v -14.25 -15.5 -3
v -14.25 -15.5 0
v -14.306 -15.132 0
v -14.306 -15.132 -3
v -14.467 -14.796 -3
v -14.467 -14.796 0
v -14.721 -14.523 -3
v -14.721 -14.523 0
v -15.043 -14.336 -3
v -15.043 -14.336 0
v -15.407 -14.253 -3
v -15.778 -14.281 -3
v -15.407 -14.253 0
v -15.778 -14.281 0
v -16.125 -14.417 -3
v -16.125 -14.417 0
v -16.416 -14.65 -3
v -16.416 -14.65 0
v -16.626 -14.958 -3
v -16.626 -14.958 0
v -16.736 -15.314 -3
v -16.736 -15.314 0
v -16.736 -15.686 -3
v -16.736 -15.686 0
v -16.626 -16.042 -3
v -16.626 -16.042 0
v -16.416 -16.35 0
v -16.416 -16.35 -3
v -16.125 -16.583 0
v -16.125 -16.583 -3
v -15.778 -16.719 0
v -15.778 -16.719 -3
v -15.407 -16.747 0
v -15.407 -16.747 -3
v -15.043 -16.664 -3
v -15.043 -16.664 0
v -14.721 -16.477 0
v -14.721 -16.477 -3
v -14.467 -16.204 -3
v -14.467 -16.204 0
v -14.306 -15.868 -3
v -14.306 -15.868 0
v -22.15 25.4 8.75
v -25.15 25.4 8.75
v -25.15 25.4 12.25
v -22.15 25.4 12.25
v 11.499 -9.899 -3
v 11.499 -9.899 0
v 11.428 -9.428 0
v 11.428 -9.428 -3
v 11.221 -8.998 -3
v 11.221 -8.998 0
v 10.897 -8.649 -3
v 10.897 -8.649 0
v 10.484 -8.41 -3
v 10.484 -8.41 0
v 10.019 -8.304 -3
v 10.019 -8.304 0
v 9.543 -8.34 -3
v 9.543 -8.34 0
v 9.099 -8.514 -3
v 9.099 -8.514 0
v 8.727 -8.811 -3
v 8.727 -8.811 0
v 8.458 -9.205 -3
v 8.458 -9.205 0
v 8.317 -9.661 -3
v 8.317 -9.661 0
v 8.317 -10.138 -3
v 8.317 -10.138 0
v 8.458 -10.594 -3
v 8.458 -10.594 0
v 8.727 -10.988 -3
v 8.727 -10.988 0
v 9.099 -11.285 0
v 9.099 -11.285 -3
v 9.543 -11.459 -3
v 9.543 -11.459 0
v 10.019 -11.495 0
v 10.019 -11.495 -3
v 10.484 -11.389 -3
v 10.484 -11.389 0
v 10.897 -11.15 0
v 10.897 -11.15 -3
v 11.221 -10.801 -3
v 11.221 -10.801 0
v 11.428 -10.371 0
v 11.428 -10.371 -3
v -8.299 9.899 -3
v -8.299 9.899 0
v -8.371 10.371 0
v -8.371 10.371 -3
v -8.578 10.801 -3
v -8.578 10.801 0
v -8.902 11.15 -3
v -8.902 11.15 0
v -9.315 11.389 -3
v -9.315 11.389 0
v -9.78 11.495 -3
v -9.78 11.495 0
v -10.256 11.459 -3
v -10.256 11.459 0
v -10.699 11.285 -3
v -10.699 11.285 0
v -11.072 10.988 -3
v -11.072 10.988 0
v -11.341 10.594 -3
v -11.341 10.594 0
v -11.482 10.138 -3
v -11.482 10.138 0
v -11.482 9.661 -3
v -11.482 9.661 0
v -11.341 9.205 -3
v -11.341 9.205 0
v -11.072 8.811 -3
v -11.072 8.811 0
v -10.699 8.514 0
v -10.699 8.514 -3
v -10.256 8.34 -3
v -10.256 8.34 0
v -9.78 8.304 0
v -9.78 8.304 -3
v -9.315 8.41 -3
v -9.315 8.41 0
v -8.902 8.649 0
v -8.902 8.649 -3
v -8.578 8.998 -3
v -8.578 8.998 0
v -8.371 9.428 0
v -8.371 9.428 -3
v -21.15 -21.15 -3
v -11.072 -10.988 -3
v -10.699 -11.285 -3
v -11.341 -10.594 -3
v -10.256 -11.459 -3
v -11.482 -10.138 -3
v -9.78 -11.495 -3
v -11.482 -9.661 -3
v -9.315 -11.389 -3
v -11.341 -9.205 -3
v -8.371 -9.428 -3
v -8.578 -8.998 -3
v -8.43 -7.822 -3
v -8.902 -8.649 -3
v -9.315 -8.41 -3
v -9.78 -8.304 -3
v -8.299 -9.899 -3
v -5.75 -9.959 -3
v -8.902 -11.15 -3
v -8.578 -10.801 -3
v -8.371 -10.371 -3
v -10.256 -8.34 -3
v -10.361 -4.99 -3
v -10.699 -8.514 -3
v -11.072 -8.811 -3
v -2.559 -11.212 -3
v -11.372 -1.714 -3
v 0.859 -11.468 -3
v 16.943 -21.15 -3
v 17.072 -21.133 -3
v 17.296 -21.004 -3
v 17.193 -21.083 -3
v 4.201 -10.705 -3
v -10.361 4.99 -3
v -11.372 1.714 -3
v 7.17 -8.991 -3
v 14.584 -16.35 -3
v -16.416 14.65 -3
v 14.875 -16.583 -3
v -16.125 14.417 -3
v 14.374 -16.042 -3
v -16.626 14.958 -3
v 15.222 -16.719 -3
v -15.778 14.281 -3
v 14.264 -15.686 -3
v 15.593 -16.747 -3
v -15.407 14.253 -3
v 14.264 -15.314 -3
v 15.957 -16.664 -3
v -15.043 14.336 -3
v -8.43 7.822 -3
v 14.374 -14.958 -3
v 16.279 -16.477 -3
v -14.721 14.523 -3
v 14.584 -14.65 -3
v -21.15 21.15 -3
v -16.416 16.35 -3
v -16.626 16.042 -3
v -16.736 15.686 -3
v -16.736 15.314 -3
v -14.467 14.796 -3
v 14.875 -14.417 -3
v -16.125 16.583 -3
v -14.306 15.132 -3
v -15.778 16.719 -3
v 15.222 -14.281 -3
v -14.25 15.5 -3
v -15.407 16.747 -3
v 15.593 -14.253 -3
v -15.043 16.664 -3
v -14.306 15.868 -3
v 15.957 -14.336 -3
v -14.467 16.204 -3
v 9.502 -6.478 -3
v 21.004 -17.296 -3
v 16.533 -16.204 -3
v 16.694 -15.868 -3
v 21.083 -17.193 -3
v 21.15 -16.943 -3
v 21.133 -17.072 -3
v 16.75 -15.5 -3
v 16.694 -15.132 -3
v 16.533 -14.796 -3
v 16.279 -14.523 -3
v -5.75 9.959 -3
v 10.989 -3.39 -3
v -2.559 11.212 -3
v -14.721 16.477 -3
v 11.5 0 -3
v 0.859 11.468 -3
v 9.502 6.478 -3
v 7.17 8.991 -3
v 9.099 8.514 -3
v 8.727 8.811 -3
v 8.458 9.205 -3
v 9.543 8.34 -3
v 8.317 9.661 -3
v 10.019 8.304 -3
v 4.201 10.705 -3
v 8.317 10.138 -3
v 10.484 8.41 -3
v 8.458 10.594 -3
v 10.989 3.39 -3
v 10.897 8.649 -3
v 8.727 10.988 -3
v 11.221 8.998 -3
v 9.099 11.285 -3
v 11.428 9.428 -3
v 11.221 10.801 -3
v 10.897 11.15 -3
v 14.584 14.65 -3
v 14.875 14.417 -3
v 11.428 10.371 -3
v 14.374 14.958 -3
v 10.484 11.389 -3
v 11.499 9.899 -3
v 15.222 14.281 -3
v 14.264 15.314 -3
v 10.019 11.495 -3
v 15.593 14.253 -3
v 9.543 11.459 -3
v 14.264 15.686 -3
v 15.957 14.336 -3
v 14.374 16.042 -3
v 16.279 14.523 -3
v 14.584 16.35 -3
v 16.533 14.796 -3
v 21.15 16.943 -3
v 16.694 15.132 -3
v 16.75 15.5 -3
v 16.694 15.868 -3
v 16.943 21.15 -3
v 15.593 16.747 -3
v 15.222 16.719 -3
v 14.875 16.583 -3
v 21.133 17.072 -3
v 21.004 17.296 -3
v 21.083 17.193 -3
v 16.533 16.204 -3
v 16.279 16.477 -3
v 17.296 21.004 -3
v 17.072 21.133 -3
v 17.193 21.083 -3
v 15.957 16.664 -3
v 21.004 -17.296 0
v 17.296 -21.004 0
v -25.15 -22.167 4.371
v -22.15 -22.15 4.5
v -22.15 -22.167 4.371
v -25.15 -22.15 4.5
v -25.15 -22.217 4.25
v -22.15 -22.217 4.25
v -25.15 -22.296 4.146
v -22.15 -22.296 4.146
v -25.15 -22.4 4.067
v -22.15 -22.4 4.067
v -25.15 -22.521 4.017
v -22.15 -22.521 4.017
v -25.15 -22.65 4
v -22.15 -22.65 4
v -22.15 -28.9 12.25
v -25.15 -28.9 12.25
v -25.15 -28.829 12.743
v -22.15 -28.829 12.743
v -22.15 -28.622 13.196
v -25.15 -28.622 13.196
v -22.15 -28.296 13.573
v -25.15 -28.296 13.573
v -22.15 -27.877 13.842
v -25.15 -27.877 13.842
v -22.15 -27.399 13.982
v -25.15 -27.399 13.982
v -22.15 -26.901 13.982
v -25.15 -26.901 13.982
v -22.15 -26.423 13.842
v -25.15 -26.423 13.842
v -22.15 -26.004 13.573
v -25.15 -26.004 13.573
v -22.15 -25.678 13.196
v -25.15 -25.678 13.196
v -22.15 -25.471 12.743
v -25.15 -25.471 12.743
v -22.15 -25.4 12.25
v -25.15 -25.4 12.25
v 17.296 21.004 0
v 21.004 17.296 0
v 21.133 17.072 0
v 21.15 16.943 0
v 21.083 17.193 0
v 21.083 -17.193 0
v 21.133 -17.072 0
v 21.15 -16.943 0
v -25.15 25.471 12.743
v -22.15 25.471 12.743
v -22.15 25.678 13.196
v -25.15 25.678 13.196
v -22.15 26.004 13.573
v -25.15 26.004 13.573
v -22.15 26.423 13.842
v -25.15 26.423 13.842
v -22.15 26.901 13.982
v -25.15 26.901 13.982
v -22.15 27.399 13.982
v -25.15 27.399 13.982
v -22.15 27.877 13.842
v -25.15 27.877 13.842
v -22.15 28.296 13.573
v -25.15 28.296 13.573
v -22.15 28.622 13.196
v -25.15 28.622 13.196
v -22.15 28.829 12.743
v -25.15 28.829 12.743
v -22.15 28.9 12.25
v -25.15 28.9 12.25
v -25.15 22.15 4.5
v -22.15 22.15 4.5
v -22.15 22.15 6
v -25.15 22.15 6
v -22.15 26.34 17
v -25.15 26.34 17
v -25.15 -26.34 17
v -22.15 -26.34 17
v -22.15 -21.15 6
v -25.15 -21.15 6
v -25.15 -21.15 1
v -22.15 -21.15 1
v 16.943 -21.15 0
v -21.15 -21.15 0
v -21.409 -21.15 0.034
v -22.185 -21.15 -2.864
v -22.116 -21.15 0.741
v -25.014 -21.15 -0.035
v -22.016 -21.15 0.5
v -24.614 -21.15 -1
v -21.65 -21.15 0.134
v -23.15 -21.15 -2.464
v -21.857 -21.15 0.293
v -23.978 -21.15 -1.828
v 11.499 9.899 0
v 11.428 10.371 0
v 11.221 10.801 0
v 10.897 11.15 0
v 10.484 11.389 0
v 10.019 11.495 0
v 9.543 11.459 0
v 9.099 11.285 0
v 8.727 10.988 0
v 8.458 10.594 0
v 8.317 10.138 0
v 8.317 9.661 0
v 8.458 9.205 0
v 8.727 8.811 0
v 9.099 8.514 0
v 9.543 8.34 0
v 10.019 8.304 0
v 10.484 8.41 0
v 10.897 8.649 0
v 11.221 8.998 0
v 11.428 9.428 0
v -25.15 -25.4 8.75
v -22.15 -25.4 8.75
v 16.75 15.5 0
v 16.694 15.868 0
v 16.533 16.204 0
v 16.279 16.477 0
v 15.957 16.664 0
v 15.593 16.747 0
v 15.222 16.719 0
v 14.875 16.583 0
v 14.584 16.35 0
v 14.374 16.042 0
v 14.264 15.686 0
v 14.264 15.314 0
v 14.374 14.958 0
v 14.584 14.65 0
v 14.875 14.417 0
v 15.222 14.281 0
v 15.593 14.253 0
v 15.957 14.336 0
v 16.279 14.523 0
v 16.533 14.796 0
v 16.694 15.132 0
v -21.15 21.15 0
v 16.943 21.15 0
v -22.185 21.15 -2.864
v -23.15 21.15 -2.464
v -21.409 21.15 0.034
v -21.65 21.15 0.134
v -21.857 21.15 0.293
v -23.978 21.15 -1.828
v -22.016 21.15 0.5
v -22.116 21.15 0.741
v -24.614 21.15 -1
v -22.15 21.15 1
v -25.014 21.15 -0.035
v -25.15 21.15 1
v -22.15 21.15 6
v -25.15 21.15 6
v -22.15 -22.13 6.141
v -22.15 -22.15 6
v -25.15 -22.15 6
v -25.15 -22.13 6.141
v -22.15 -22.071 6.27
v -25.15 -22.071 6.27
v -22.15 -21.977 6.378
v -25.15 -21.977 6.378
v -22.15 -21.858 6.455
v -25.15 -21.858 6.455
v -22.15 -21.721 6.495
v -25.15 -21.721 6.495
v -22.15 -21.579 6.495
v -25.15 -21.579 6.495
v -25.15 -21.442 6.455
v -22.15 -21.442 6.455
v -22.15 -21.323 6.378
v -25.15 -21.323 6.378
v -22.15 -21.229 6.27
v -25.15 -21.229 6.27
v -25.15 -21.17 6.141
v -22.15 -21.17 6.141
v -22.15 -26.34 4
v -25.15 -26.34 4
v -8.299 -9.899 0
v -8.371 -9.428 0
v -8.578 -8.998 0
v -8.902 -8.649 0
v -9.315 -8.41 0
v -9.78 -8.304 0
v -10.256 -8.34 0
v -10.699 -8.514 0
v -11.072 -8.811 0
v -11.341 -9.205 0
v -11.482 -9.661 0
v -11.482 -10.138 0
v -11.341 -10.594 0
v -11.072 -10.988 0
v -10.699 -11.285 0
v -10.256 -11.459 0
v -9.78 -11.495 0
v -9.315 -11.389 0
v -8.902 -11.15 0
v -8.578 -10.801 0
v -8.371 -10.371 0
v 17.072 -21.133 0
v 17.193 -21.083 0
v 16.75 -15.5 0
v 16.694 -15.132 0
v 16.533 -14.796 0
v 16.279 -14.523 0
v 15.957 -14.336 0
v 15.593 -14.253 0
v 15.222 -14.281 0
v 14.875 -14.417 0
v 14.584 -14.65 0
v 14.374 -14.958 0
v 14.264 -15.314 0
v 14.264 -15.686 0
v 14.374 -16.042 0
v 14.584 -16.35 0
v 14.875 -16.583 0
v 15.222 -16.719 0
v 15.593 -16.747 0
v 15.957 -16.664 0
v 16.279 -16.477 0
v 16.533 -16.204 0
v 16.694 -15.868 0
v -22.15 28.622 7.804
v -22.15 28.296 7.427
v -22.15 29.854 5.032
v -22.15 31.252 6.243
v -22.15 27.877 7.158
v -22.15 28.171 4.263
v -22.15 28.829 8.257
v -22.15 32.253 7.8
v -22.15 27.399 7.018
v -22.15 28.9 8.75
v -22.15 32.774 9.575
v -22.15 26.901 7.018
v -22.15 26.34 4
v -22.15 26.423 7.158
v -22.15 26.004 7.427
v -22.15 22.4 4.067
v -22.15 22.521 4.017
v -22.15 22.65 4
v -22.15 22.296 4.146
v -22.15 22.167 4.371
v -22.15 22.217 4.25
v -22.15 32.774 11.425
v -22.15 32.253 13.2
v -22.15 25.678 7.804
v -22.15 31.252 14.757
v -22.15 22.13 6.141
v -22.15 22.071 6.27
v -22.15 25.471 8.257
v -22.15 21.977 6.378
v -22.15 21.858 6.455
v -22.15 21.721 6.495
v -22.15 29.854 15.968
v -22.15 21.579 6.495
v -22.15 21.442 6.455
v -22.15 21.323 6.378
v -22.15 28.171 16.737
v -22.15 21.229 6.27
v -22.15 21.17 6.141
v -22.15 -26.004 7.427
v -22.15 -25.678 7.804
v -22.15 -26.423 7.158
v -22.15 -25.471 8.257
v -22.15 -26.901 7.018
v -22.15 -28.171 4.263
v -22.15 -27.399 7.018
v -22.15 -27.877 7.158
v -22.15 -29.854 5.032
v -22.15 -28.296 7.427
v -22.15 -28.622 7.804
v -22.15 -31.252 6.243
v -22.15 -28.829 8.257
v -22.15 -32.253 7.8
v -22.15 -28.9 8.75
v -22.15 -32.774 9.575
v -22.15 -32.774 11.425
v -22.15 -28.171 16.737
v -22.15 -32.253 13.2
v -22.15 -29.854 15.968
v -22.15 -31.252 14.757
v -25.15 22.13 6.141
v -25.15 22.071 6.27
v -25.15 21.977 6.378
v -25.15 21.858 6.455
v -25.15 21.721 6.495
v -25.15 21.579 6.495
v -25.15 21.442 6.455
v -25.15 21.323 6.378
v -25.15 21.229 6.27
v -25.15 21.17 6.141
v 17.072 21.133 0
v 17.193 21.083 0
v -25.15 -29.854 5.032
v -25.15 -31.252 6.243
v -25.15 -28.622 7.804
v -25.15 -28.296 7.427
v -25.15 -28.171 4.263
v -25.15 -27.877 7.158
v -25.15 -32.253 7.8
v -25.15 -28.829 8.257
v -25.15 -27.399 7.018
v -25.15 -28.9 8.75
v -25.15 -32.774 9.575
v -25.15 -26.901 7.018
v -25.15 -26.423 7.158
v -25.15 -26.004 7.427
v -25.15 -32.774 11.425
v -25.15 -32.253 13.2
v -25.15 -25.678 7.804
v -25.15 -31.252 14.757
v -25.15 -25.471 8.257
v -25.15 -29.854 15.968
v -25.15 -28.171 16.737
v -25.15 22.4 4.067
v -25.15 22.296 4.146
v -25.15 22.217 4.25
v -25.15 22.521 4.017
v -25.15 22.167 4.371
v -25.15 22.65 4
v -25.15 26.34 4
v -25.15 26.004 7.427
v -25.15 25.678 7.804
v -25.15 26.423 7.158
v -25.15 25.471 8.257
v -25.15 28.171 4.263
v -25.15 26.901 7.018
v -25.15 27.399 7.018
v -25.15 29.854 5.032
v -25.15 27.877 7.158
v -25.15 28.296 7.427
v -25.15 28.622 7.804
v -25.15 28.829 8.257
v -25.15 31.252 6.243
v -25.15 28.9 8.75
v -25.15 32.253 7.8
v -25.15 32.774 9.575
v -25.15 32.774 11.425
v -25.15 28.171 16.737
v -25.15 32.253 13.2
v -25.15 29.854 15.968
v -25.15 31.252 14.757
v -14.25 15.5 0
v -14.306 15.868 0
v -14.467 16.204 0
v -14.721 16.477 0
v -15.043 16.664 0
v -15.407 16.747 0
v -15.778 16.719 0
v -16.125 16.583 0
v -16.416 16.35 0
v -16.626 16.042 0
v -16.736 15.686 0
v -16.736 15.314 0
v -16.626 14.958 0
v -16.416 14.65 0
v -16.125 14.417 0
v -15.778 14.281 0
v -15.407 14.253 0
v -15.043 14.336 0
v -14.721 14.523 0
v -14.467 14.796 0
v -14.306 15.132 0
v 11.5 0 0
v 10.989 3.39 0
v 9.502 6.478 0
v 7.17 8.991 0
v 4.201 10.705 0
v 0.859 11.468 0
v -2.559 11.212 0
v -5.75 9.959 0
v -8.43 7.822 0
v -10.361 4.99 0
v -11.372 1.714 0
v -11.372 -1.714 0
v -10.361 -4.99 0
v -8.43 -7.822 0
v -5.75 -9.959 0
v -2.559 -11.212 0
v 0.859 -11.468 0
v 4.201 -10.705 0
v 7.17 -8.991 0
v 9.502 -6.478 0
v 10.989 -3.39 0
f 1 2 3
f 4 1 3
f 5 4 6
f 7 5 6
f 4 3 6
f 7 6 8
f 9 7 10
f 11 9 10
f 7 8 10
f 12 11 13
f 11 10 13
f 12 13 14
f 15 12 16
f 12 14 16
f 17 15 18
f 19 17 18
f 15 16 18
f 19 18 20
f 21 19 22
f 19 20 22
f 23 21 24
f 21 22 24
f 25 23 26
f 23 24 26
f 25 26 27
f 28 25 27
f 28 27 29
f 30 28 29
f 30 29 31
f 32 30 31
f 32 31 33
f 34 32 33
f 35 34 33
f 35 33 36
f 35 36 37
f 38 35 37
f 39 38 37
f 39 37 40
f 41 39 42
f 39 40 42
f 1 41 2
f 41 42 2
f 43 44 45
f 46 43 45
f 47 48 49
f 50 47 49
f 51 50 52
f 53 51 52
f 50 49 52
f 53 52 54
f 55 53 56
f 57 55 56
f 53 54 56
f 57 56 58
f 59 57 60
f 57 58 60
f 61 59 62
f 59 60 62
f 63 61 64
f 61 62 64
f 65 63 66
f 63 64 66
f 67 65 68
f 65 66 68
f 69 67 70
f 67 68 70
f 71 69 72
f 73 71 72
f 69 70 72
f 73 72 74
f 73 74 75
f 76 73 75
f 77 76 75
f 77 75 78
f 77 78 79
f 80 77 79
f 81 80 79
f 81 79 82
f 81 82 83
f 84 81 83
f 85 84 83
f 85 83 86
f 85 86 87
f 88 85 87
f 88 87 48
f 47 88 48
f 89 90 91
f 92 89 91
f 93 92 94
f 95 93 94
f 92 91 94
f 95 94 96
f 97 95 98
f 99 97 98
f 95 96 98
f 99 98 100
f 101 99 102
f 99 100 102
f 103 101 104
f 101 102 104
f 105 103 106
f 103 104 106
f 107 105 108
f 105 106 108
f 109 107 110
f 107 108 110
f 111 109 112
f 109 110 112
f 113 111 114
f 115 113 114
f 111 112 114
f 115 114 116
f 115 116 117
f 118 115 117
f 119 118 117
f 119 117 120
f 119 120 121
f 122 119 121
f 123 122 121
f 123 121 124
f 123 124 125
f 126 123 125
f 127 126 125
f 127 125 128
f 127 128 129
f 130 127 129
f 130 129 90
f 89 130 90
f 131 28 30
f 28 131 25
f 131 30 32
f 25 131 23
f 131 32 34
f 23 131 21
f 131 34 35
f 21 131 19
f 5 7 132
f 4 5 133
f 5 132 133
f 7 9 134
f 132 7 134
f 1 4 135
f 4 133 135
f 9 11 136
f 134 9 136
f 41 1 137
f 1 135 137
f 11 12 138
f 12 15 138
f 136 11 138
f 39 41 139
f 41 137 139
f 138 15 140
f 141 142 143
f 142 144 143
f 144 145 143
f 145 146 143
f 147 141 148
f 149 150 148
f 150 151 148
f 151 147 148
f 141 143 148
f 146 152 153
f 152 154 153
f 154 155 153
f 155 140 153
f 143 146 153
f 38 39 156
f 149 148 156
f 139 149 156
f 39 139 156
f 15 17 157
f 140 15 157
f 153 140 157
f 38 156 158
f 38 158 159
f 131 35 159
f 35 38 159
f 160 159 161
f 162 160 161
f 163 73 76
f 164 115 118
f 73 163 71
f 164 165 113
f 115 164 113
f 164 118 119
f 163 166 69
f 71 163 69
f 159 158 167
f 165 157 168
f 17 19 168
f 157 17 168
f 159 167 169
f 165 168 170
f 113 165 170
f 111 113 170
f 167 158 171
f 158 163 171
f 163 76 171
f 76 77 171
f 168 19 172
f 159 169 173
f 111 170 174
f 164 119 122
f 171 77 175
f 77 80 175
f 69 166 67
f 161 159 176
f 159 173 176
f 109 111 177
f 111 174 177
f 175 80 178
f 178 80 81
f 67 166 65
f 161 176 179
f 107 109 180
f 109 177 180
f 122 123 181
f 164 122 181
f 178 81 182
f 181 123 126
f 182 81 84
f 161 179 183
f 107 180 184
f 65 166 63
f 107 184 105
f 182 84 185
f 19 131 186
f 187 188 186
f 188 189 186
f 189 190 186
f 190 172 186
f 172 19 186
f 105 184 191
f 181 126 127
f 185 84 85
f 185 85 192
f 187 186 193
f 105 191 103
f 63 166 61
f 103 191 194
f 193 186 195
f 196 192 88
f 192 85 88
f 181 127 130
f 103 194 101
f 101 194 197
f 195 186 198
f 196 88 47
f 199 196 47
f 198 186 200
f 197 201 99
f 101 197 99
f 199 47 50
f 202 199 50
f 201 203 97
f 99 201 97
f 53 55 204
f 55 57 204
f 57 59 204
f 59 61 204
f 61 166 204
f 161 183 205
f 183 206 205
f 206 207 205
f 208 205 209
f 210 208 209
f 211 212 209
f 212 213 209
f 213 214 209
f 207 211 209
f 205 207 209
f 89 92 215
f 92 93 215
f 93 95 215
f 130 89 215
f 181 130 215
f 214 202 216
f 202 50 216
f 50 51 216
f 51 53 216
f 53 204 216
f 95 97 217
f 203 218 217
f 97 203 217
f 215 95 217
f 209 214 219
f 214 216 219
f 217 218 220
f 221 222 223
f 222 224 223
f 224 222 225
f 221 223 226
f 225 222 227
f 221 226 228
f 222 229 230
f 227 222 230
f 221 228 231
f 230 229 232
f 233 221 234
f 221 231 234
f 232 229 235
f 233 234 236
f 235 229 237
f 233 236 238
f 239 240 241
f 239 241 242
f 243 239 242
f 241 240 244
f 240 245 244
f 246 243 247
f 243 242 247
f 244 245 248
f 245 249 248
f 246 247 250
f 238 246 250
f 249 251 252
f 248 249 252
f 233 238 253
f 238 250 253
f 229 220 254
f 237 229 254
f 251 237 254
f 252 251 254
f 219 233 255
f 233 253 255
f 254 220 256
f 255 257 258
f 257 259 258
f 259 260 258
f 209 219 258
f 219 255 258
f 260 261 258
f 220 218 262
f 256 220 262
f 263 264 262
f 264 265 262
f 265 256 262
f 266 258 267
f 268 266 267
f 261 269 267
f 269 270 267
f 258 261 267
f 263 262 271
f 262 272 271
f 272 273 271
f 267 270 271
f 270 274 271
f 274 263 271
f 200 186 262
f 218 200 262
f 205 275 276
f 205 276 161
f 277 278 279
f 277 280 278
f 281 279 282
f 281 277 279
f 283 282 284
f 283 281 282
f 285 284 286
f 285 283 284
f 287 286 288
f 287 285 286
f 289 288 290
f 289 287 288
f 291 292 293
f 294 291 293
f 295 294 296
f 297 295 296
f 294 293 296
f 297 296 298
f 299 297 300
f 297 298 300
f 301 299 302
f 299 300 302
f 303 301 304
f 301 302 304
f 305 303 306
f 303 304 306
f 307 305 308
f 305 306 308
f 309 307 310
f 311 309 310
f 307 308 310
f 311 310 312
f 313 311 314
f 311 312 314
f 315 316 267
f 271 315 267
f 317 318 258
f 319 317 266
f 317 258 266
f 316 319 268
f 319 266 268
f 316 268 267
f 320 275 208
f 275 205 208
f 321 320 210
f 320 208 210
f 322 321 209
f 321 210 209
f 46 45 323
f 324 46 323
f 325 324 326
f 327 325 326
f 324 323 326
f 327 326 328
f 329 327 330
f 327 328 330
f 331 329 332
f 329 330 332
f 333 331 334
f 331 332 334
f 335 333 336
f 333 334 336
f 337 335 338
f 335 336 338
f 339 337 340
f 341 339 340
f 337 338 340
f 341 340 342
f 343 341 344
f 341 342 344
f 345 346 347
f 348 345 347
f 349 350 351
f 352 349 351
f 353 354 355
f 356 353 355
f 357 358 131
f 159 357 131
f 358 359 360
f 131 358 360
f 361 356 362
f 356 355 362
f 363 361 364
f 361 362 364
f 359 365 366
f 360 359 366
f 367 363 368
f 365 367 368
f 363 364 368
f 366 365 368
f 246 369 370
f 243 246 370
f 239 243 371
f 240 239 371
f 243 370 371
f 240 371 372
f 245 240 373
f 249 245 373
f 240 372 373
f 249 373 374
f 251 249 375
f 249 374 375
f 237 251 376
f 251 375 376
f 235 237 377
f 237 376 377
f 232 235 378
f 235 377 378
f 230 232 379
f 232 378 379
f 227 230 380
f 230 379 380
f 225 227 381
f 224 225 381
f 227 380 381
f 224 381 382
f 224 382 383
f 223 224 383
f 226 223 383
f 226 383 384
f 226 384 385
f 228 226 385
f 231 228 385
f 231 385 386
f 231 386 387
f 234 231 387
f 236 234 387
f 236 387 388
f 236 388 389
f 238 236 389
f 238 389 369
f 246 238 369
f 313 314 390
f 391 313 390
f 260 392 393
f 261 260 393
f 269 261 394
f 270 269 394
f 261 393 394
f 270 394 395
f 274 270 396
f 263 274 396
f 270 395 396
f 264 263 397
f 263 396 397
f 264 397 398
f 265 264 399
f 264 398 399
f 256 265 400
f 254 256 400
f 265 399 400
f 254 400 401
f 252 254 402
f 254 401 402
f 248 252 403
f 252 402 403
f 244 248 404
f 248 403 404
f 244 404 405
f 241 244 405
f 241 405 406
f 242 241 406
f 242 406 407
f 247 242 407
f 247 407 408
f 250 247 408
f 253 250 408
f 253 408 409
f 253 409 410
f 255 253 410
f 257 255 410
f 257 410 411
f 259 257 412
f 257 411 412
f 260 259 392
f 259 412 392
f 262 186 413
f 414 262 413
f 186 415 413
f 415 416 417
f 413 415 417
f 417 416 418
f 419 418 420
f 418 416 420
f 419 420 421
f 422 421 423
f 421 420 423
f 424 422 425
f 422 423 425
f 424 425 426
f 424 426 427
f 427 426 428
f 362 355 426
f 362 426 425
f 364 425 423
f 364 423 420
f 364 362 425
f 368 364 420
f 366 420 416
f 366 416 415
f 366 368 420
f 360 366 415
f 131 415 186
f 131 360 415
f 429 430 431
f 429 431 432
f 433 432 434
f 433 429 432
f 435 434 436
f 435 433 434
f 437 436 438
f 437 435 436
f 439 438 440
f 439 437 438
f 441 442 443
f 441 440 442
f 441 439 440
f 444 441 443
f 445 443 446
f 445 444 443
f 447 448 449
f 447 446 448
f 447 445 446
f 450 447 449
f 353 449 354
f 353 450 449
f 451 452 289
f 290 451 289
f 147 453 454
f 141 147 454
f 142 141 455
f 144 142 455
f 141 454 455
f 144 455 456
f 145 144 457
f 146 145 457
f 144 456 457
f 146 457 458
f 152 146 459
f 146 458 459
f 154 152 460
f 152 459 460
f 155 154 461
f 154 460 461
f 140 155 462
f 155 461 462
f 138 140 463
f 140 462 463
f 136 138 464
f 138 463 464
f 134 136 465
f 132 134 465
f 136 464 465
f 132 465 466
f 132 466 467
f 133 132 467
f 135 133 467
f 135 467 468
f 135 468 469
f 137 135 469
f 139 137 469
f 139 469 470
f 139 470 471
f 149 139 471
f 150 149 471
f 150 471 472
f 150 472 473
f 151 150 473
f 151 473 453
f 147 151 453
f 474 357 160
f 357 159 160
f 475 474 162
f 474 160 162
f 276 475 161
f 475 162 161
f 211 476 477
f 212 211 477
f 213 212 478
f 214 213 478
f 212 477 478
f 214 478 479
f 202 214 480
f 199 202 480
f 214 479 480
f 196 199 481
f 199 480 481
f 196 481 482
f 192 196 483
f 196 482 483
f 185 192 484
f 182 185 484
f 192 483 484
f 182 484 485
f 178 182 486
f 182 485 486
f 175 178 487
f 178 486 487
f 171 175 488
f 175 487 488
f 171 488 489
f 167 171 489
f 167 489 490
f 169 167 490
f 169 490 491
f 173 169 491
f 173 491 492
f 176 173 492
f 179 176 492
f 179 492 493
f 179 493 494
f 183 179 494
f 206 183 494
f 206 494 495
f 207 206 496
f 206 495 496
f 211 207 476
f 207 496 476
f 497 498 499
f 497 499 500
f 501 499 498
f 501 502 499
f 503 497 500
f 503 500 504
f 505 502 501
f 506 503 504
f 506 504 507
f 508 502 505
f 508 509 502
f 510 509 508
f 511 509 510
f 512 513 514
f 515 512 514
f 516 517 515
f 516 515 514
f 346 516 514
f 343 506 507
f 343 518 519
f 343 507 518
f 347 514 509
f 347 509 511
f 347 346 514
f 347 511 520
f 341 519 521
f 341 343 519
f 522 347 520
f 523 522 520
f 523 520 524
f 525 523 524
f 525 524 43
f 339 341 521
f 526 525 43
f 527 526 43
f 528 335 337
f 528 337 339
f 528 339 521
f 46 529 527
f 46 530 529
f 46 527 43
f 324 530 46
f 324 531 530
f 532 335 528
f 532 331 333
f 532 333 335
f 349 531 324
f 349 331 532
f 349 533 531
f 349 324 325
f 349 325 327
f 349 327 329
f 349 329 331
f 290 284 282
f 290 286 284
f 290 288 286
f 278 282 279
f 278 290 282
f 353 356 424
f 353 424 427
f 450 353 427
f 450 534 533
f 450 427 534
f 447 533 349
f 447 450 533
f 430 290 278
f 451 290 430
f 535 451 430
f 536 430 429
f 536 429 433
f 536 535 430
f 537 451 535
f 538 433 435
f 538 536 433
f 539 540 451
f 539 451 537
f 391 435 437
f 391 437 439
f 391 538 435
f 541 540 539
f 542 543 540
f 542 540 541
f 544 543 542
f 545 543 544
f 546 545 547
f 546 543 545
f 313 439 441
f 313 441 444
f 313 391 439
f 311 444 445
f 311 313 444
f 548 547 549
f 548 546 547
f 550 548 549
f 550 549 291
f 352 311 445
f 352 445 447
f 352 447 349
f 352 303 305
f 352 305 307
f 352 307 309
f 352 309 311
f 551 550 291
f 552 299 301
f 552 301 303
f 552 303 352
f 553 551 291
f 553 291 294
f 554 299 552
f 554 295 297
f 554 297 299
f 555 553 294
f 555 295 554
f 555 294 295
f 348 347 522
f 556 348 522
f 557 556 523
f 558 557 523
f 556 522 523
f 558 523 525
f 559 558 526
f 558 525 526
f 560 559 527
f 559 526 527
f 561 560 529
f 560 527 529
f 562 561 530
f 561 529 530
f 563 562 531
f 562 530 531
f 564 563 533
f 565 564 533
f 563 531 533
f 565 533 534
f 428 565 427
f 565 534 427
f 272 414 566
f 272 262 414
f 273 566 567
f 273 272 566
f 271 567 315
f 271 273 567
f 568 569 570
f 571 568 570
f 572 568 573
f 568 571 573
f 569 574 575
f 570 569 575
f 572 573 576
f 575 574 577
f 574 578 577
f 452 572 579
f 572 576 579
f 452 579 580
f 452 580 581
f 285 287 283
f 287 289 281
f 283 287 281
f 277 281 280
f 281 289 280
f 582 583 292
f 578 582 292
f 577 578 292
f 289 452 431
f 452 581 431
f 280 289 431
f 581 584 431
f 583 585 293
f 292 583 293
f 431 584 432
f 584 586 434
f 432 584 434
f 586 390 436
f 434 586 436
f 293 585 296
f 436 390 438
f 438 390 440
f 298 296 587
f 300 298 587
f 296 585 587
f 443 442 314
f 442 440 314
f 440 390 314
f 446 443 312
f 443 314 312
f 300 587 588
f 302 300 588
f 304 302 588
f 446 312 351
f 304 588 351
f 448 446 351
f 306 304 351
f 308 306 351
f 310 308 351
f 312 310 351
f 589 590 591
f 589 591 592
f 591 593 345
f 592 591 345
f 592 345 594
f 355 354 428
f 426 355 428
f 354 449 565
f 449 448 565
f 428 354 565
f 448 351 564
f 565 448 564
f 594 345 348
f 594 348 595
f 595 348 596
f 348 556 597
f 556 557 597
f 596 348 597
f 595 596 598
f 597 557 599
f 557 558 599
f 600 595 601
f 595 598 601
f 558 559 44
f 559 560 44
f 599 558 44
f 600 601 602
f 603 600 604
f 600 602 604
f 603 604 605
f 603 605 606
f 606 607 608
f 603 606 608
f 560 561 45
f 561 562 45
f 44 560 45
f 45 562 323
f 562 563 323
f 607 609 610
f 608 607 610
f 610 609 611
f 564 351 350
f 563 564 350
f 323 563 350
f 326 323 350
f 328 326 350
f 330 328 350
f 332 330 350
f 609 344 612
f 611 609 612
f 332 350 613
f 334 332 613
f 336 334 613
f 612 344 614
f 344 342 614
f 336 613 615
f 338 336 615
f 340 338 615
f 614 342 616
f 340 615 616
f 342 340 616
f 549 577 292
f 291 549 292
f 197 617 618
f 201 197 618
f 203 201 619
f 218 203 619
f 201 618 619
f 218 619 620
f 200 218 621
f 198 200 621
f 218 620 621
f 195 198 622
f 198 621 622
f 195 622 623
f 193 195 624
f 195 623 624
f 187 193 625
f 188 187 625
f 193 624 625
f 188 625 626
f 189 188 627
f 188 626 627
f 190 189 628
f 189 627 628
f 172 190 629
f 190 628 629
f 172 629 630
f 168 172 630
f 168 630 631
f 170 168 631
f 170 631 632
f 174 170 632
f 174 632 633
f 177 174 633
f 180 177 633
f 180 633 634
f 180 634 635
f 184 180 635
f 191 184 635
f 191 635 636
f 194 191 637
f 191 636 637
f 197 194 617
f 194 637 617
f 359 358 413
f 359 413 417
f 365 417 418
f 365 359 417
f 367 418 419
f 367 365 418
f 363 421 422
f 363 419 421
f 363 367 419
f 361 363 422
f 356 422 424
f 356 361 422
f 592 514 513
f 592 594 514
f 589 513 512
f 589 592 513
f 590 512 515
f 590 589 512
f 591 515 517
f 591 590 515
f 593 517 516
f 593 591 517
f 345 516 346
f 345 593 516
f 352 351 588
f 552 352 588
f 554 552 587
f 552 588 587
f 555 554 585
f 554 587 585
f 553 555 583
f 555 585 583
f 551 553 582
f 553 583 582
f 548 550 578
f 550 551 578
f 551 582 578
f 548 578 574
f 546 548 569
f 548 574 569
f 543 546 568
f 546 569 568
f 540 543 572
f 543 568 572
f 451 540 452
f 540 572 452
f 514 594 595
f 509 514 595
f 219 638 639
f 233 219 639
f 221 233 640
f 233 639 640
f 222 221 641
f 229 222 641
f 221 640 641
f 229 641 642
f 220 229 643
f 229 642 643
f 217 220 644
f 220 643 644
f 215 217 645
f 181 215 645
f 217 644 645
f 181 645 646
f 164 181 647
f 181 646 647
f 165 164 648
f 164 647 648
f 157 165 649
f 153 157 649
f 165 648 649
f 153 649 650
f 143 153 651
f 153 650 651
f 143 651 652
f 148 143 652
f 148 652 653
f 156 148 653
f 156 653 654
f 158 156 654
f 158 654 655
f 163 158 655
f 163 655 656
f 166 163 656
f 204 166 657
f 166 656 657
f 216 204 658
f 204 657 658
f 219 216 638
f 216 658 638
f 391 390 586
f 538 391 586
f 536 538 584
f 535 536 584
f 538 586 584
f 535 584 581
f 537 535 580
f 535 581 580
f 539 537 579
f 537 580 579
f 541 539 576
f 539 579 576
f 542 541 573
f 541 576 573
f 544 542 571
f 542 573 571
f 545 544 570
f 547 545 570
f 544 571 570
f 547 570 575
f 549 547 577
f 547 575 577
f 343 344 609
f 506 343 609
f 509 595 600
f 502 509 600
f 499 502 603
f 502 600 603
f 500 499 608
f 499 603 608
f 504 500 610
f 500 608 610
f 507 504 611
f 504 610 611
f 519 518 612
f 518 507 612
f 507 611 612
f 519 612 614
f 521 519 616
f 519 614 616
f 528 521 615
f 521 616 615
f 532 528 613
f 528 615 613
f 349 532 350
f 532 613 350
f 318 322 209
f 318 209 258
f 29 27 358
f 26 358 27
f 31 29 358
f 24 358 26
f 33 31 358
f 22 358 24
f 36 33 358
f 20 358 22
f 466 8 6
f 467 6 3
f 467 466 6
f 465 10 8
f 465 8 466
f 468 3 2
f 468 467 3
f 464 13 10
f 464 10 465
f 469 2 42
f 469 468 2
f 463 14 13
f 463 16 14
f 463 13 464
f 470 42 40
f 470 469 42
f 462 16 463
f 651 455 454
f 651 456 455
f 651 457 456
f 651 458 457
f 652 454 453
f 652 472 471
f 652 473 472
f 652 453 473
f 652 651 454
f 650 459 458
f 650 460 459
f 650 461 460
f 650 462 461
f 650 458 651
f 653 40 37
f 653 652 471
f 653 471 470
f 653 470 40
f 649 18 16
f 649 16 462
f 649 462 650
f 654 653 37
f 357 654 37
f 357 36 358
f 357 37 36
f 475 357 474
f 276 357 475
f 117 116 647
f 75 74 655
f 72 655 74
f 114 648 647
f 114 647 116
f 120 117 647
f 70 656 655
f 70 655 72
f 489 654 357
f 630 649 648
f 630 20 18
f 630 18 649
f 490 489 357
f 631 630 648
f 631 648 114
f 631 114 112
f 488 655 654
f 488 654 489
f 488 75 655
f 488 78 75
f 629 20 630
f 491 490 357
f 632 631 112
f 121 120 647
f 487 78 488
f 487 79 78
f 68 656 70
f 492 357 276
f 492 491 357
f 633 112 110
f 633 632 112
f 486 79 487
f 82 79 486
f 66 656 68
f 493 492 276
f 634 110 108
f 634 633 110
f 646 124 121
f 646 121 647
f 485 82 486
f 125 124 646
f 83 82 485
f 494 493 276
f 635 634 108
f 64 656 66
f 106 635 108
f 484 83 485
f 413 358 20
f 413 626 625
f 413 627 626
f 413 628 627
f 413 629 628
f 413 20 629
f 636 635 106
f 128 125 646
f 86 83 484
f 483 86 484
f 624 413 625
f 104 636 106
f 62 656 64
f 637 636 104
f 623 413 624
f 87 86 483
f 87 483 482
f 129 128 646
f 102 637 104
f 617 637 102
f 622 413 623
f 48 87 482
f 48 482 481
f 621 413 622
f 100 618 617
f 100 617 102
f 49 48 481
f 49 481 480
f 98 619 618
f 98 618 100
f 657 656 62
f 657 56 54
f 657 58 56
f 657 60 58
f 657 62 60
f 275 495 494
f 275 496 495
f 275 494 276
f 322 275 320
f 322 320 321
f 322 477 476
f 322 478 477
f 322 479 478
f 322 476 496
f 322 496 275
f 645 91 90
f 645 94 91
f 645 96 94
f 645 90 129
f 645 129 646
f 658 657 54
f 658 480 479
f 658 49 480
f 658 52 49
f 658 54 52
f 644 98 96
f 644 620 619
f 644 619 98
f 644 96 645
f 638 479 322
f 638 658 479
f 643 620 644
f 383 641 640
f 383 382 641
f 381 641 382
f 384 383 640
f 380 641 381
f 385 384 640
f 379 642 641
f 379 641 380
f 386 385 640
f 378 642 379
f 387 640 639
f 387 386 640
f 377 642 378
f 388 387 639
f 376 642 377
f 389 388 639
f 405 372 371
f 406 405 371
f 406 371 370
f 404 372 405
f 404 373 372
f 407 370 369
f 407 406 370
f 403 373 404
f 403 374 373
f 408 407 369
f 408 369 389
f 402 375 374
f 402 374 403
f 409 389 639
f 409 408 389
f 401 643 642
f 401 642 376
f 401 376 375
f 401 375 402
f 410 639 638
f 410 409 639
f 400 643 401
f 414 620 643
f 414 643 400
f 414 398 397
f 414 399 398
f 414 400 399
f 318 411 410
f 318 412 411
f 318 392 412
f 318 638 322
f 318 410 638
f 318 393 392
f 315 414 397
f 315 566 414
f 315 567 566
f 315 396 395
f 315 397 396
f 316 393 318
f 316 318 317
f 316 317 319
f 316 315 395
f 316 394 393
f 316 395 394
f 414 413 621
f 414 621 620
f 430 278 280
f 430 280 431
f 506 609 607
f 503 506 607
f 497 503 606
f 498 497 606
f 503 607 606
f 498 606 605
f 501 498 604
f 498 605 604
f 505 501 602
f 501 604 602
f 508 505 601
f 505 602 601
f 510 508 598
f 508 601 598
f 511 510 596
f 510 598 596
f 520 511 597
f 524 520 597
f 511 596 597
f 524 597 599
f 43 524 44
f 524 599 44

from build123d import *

# Parameters (mm, degrees)
CROQUIS1_W                       = 46.3
CROQUIS1_H                       = 42.3
CROQUIS1_R                       = 11.5
CROQUIS1_R_2                     = 1.25
BRIDA_BASE1_DEPTH                = 3
STRUCTURE_SUPORT_STRIP_W         = 14
STRUCTURE_SUPORT_STRIP_H         = 3
STRUCTURE_SUPORT_STRIP_CUT_DEPTH = 42.3
STRUCTURE_SUPORT_DEPTH           = 42.3
STRUCTURE_SUPORT_FLAT_DEPTH      = 3
CROQUIS13_R                      = 1.75
CORTAR_EXTRUIR2_DEPTH            = 57.94168596
DESDOBLAR2_DEPTH                 = 17
DESDOBLAR2_START                 = -3
DESDOBLAR2_2_DEPTH               = 3
DOBLAR2_START                    = -41.076990817
DOBLAR2_OUTLINE_W                = 57.8
DOBLAR2_OUTLINE_H                = 3
DOBLAR2_DEPTH                    = 16
DOBLAR2_START_2                  = -24.77248
DOBLAR2_2_DEPTH                  = 2.62248
DOBLAR2_START_3                  = -25.15
DOBLAR2_3_DEPTH                  = 4
DOBLAR2_START_4                  = -34
DOBLAR2_4_DEPTH                  = 68
CHAFL_N1_SIZE                    = 4
TALADRO_DE_MARGEN_PARA_M31_D     = 3.2
CORTAR_EXTRUIR6_REACH            = 58.942
REDONDEO2_R                      = 0.5


with BuildPart() as part:
    # Brida base1: sheet metal written as solids
    # Croquis1 → Brida base1 (new body)
    with BuildSketch(Plane.XY):
        with Locations((-2, 0)):
            Rectangle(CROQUIS1_W, CROQUIS1_H)
        Circle(CROQUIS1_R, mode=Mode.SUBTRACT)
        with Locations((-15.5, 15.5)):
            Circle(CROQUIS1_R_2, mode=Mode.SUBTRACT)
        with Locations((-15.5, -15.5)):
            Circle(CROQUIS1_R_2, mode=Mode.SUBTRACT)
        with Locations((15.5, -15.5)):
            Circle(CROQUIS1_R_2, mode=Mode.SUBTRACT)
        with Locations((15.5, 15.5)):
            Circle(CROQUIS1_R_2, mode=Mode.SUBTRACT)
    extrude(amount=-BRIDA_BASE1_DEPTH)

    # Structure Suport: sheet metal written as solids
    # Structure Suport strip (on a plane across the edge) → Structure Suport strip cut (cut)
    with BuildSketch(Plane(origin=(-25.15, 21.15, 0), x_dir=(1, 0, 0), z_dir=(0, -1, 0))):
        with Locations((-3, -1.5)):
            Rectangle(STRUCTURE_SUPORT_STRIP_W, STRUCTURE_SUPORT_STRIP_H)
    extrude(amount=STRUCTURE_SUPORT_STRIP_CUT_DEPTH, mode=Mode.SUBTRACT)

    # Structure Suport bend section (on a plane across the edge) → Structure Suport (add)
    with BuildSketch(Plane(origin=(-25.15, 21.15, 0), x_dir=(1, 0, 0), z_dir=(0, -1, 0))):
        with BuildLine():
            Line((0, 1), (3, 1))
            ThreePointArc((3, 1), (3.292893219, 0.292893219), (4, 0))
            Line((4, 0), (4, -3))
            ThreePointArc((4, -3), (1.171572875, -1.828427125), (0, 1))
        make_face()
    extrude(amount=STRUCTURE_SUPORT_DEPTH)

    # Structure Suport profile (on flange) → Structure Suport flat (add)
    with BuildSketch(Plane(origin=(-25.15, 0, 0), x_dir=(0, -1, 0), z_dir=(-1, 0, 0))):
        with BuildLine():
            ThreePointArc((-26.34, 17), (-32.84, 10.5), (-26.34, 4))
            Line((-26.34, 4), (-21.15, 4))
            Line((-21.15, 4), (-21.15, 1))
            Line((-21.15, 1), (21.15, 1))
            Line((21.15, 1), (21.15, 4))
            Line((21.15, 4), (26.34, 4))
            ThreePointArc((26.34, 4), (32.84, 10.5), (26.34, 17))
            Line((26.34, 17), (-26.34, 17))
        make_face()
    extrude(amount=-STRUCTURE_SUPORT_FLAT_DEPTH)

    # Croquis13 → Cortar-Extruir2 (cut, through all)
    with BuildSketch(Plane(origin=(-22.15, 0, 0), x_dir=(0, 0, -1), z_dir=(1, 0, 0))):
        with Locations((-10.5, 27.15)):
            Circle(CROQUIS13_R)
        with BuildLine():
            Line((-10.5, 28.9), (-12.25, 28.9))
            ThreePointArc((-12.25, 28.9), (-14, 27.15), (-12.25, 25.4))
            Line((-12.25, 25.4), (-10.5, 25.4))
            ThreePointArc((-10.5, 25.4), (-12.25, 27.15), (-10.5, 28.9))
        make_face()
        with BuildLine():
            Line((-8.75, 28.9), (-10.5, 28.9))
            ThreePointArc((-10.5, 28.9), (-9.262563133, 28.387436867), (-8.75, 27.15))
            ThreePointArc((-8.75, 27.15), (-9.262563133, 25.912563133), (-10.5, 25.4))
            Line((-10.5, 25.4), (-8.75, 25.4))
            ThreePointArc((-8.75, 25.4), (-7, 27.15), (-8.75, 28.9))
        make_face()
        with Locations((-10.5, -27.15)):
            Circle(CROQUIS13_R)
        with BuildLine():
            Line((-10.5, -25.4), (-12.25, -25.4))
            ThreePointArc((-12.25, -25.4), (-14, -27.15), (-12.25, -28.9))
            Line((-12.25, -28.9), (-10.5, -28.9))
            ThreePointArc((-10.5, -28.9), (-12.25, -27.15), (-10.5, -25.4))
        make_face()
        with BuildLine():
            Line((-8.75, -25.4), (-10.5, -25.4))
            ThreePointArc((-10.5, -25.4), (-9.262563133, -25.912563133), (-8.75, -27.15))
            ThreePointArc((-8.75, -27.15), (-9.262563133, -28.387436867), (-10.5, -28.9))
            Line((-10.5, -28.9), (-8.75, -28.9))
            ThreePointArc((-8.75, -28.9), (-7, -27.15), (-8.75, -25.4))
        make_face()
    extrude(amount=-CORTAR_EXTRUIR2_DEPTH, mode=Mode.SUBTRACT)

    # Desdoblar2: read off the stored shape, not the designer's step
    # Desdoblar2 outline → Desdoblar2 (cut)
    with BuildSketch(Plane.XY):
        Polygon((-25.15, -34), (-22.15, -34), (-22.15, -21.15), (-20, -21.15), (-20, 21.15), (-22.15, 21.15), (-22.15, 34), (-25.15, 34), align=None)
    extrude(amount=DESDOBLAR2_DEPTH, mode=Mode.SUBTRACT)

    # Desdoblar2 2 outline → Desdoblar2 2 (add)
    with BuildSketch(Plane.XY.offset(DESDOBLAR2_START)):
        with BuildLine():
            Line((-28.076990817, 21.15), (-28.076990817, 26.34))
            ThreePointArc((-28.076990817, 26.34), (-34.576990817, 32.84), (-41.076990817, 26.34))
            Line((-41.076990817, 26.34), (-41.076990817, -26.34))
            ThreePointArc((-41.076990817, -26.34), (-34.576990817, -32.84), (-28.076990817, -26.34))
            Line((-28.076990817, -26.34), (-28.076990817, -21.15))
            Line((-28.076990817, -21.15), (-20, -21.15))
            Line((-20, -21.15), (-20, 21.15))
            Line((-20, 21.15), (-28.076990817, 21.15))
        make_face()
        with BuildLine():
            Line((-36.326990817, -25.4), (-32.826990817, -25.4))
            ThreePointArc((-32.826990817, -25.4), (-31.076990817, -27.15), (-32.826990817, -28.9))
            Line((-32.826990817, -28.9), (-36.326990817, -28.9))
            ThreePointArc((-36.326990817, -28.9), (-38.076990817, -27.15), (-36.326990817, -25.4))
        make_face(mode=Mode.SUBTRACT)
        with BuildLine():
            Line((-32.826990817, 25.4), (-36.326990817, 25.4))
            ThreePointArc((-36.326990817, 25.4), (-38.076990817, 27.15), (-36.326990817, 28.9))
            Line((-36.326990817, 28.9), (-32.826990817, 28.9))
            ThreePointArc((-32.826990817, 28.9), (-31.076990817, 27.15), (-32.826990817, 25.4))
        make_face(mode=Mode.SUBTRACT)
    extrude(amount=DESDOBLAR2_2_DEPTH)

    # Doblar2: read off the stored shape, not the designer's step
    # Doblar2 outline → Doblar2 (cut)
    with BuildSketch(Plane.YZ.offset(DOBLAR2_START)):
        with Locations((0, -1.5)):
            Rectangle(DOBLAR2_OUTLINE_W, DOBLAR2_OUTLINE_H)
    extrude(amount=DOBLAR2_DEPTH, mode=Mode.SUBTRACT)

    # Doblar2 2 outline → Doblar2 2 (add)
    with BuildSketch(Plane.YZ.offset(DOBLAR2_START_2)):
        with BuildLine():
            Line((21.15, 0), (21.15, 4))
            Line((21.15, 4), (26.34, 4))
            ThreePointArc((26.34, 4), (32.84, 10.5), (26.34, 17))
            Line((26.34, 17), (-26.34, 17))
            ThreePointArc((-26.34, 17), (-32.84, 10.5), (-26.34, 4))
            Line((-26.34, 4), (-21.15, 4))
            Line((-21.15, 4), (-21.15, 0))
            Line((-21.15, 0), (21.15, 0))
        make_face()
        with BuildLine():
            ThreePointArc((-28.9, 12.25), (-27.15, 14), (-25.4, 12.25))
            Line((-25.4, 12.25), (-25.4, 8.75))
            ThreePointArc((-25.4, 8.75), (-27.15, 7), (-28.9, 8.75))
            Line((-28.9, 8.75), (-28.9, 12.25))
        make_face(mode=Mode.SUBTRACT)
        with BuildLine():
            ThreePointArc((25.4, 12.25), (27.15, 14), (28.9, 12.25))
            Line((28.9, 12.25), (28.9, 8.75))
            ThreePointArc((28.9, 8.75), (27.15, 7), (25.4, 8.75))
            Line((25.4, 8.75), (25.4, 12.25))
        make_face(mode=Mode.SUBTRACT)
    extrude(amount=DOBLAR2_2_DEPTH)

    # Doblar2 3 outline → Doblar2 3 (add)
    with BuildSketch(Plane.YZ.offset(DOBLAR2_START_3)):
        with BuildLine():
            Line((21.15, 0), (21.15, 4))
            Line((21.15, 4), (26.34, 4))
            ThreePointArc((26.34, 4), (32.84, 10.5), (26.34, 17))
            Line((26.34, 17), (-26.34, 17))
            ThreePointArc((-26.34, 17), (-32.84, 10.5), (-26.34, 4))
            Line((-26.34, 4), (-21.15, 4))
            Line((-21.15, 4), (-21.15, 0))
            Line((-21.15, 0), (21.15, 0))
        make_face()
        with BuildLine():
            ThreePointArc((-28.9, 12.25), (-27.15, 14), (-25.4, 12.25))
            Line((-25.4, 12.25), (-25.4, 8.75))
            ThreePointArc((-25.4, 8.75), (-27.15, 7), (-28.9, 8.75))
            Line((-28.9, 8.75), (-28.9, 12.25))
        make_face(mode=Mode.SUBTRACT)
        with BuildLine():
            ThreePointArc((25.4, 12.25), (27.15, 14), (28.9, 12.25))
            Line((28.9, 12.25), (28.9, 8.75))
            ThreePointArc((28.9, 8.75), (27.15, 7), (25.4, 8.75))
            Line((25.4, 8.75), (25.4, 12.25))
        make_face(mode=Mode.SUBTRACT)
    extrude(amount=DOBLAR2_3_DEPTH)

    # Doblar2 4 outline → Doblar2 4 (cut)
    with BuildSketch(Plane(origin=(0, 0, 0), x_dir=(1, 0, 0), z_dir=(0, 1, 0)).offset(DOBLAR2_START_4)):
        with BuildLine():
            ThreePointArc((-21.15, 0), (-21.857106781, -0.292893219), (-22.15, -1))
            Line((-22.15, -1), (-22.15, -17))
            Line((-22.15, -17), (-21.15, -17))
            Line((-21.15, -17), (-21.15, 0))
        make_face()
        with BuildLine():
            Line((-25.15, -17), (-25.15, -1))
            ThreePointArc((-25.15, -1), (-23.978427125, 1.828427125), (-21.15, 3))
            Line((-21.15, 3), (-20, 3))
            Line((-20, 3), (-20, 5))
            Line((-20, 5), (-42, 5))
            Line((-42, 5), (-42, -17))
            Line((-42, -17), (-25.15, -17))
        make_face()
    extrude(amount=DOBLAR2_4_DEPTH, mode=Mode.SUBTRACT)

    # Chaflán1
    chafl_n1_edges = [part.edges().sort_by_distance(p)[0] for p in [
        (21.15, 21.15, -1.5),
        (21.15, -21.15, -1.5),
    ]]
    chamfer(chafl_n1_edges, length=CHAFL_N1_SIZE)

    # Taladro de margen para M31 (through all)
    with Locations(Plane(origin=(0, 0, -3), x_dir=(-1, 0, 0), z_dir=(0, 0, -1))):
        with Locations((9.899494937, -9.899494937), (-9.899494937, -9.899494937), (-9.899494937, 9.899494937), (9.899494937, 9.899494937)):
            Hole(TALADRO_DE_MARGEN_PARA_M31_D / 2)

    # Croquis34 → Cortar-Extruir6 (cut, up to next)
    with BuildSketch(Plane(origin=(-22.15, 0, 0), x_dir=(0, 0, -1), z_dir=(1, 0, 0)), mode=Mode.PRIVATE) as cortar_extruir6_sk1:
        with BuildLine():
            Line((-6, 21.15), (-4, 21.15))
            Line((-4, 21.15), (-4, 22.15))
            Line((-4, 22.15), (-6, 22.15))
            ThreePointArc((-6, 22.15), (-6.5, 21.65), (-6, 21.15))
        make_face()
    cortar_extruir6_tool1 = extrude(cortar_extruir6_sk1.sketch, amount=-CORTAR_EXTRUIR6_REACH, mode=Mode.PRIVATE) & part.part
    # Croquis34 → Cortar-Extruir6 (cut, up to next)
    with BuildSketch(Plane(origin=(-22.15, 0, 0), x_dir=(0, 0, -1), z_dir=(1, 0, 0)), mode=Mode.PRIVATE) as cortar_extruir6_sk2:
        with BuildLine():
            Line((-4, -22.15), (-6, -22.15))
            ThreePointArc((-6, -22.15), (-6.5, -21.65), (-6, -21.15))
            Line((-6, -21.15), (-4, -21.15))
            Line((-4, -21.15), (-4, -22.15))
        make_face()
    cortar_extruir6_tool2 = extrude(cortar_extruir6_sk2.sketch, amount=-CORTAR_EXTRUIR6_REACH, mode=Mode.PRIVATE) & part.part
    add(cortar_extruir6_tool1.solids().sort_by_distance((-22.15, 21.65, 5.198952))[0], mode=Mode.SUBTRACT)
    add(cortar_extruir6_tool2.solids().sort_by_distance((-22.15, -21.65, 5.198952))[0], mode=Mode.SUBTRACT)

    # Redondeo2
    redondeo2_edges = [part.edges().sort_by_distance(p)[0] for p in [
        (21.15, -17.15, -1.5),
        (21.15, 17.15, -1.5),
        (17.15, 21.15, -1.5),
        (17.15, -21.15, -1.5),
        (-23.65, -22.15, 4),
        (-23.65, 22.15, 4),
    ]]
    fillet(redondeo2_edges, radius=REDONDEO2_R)


solid = part.part
